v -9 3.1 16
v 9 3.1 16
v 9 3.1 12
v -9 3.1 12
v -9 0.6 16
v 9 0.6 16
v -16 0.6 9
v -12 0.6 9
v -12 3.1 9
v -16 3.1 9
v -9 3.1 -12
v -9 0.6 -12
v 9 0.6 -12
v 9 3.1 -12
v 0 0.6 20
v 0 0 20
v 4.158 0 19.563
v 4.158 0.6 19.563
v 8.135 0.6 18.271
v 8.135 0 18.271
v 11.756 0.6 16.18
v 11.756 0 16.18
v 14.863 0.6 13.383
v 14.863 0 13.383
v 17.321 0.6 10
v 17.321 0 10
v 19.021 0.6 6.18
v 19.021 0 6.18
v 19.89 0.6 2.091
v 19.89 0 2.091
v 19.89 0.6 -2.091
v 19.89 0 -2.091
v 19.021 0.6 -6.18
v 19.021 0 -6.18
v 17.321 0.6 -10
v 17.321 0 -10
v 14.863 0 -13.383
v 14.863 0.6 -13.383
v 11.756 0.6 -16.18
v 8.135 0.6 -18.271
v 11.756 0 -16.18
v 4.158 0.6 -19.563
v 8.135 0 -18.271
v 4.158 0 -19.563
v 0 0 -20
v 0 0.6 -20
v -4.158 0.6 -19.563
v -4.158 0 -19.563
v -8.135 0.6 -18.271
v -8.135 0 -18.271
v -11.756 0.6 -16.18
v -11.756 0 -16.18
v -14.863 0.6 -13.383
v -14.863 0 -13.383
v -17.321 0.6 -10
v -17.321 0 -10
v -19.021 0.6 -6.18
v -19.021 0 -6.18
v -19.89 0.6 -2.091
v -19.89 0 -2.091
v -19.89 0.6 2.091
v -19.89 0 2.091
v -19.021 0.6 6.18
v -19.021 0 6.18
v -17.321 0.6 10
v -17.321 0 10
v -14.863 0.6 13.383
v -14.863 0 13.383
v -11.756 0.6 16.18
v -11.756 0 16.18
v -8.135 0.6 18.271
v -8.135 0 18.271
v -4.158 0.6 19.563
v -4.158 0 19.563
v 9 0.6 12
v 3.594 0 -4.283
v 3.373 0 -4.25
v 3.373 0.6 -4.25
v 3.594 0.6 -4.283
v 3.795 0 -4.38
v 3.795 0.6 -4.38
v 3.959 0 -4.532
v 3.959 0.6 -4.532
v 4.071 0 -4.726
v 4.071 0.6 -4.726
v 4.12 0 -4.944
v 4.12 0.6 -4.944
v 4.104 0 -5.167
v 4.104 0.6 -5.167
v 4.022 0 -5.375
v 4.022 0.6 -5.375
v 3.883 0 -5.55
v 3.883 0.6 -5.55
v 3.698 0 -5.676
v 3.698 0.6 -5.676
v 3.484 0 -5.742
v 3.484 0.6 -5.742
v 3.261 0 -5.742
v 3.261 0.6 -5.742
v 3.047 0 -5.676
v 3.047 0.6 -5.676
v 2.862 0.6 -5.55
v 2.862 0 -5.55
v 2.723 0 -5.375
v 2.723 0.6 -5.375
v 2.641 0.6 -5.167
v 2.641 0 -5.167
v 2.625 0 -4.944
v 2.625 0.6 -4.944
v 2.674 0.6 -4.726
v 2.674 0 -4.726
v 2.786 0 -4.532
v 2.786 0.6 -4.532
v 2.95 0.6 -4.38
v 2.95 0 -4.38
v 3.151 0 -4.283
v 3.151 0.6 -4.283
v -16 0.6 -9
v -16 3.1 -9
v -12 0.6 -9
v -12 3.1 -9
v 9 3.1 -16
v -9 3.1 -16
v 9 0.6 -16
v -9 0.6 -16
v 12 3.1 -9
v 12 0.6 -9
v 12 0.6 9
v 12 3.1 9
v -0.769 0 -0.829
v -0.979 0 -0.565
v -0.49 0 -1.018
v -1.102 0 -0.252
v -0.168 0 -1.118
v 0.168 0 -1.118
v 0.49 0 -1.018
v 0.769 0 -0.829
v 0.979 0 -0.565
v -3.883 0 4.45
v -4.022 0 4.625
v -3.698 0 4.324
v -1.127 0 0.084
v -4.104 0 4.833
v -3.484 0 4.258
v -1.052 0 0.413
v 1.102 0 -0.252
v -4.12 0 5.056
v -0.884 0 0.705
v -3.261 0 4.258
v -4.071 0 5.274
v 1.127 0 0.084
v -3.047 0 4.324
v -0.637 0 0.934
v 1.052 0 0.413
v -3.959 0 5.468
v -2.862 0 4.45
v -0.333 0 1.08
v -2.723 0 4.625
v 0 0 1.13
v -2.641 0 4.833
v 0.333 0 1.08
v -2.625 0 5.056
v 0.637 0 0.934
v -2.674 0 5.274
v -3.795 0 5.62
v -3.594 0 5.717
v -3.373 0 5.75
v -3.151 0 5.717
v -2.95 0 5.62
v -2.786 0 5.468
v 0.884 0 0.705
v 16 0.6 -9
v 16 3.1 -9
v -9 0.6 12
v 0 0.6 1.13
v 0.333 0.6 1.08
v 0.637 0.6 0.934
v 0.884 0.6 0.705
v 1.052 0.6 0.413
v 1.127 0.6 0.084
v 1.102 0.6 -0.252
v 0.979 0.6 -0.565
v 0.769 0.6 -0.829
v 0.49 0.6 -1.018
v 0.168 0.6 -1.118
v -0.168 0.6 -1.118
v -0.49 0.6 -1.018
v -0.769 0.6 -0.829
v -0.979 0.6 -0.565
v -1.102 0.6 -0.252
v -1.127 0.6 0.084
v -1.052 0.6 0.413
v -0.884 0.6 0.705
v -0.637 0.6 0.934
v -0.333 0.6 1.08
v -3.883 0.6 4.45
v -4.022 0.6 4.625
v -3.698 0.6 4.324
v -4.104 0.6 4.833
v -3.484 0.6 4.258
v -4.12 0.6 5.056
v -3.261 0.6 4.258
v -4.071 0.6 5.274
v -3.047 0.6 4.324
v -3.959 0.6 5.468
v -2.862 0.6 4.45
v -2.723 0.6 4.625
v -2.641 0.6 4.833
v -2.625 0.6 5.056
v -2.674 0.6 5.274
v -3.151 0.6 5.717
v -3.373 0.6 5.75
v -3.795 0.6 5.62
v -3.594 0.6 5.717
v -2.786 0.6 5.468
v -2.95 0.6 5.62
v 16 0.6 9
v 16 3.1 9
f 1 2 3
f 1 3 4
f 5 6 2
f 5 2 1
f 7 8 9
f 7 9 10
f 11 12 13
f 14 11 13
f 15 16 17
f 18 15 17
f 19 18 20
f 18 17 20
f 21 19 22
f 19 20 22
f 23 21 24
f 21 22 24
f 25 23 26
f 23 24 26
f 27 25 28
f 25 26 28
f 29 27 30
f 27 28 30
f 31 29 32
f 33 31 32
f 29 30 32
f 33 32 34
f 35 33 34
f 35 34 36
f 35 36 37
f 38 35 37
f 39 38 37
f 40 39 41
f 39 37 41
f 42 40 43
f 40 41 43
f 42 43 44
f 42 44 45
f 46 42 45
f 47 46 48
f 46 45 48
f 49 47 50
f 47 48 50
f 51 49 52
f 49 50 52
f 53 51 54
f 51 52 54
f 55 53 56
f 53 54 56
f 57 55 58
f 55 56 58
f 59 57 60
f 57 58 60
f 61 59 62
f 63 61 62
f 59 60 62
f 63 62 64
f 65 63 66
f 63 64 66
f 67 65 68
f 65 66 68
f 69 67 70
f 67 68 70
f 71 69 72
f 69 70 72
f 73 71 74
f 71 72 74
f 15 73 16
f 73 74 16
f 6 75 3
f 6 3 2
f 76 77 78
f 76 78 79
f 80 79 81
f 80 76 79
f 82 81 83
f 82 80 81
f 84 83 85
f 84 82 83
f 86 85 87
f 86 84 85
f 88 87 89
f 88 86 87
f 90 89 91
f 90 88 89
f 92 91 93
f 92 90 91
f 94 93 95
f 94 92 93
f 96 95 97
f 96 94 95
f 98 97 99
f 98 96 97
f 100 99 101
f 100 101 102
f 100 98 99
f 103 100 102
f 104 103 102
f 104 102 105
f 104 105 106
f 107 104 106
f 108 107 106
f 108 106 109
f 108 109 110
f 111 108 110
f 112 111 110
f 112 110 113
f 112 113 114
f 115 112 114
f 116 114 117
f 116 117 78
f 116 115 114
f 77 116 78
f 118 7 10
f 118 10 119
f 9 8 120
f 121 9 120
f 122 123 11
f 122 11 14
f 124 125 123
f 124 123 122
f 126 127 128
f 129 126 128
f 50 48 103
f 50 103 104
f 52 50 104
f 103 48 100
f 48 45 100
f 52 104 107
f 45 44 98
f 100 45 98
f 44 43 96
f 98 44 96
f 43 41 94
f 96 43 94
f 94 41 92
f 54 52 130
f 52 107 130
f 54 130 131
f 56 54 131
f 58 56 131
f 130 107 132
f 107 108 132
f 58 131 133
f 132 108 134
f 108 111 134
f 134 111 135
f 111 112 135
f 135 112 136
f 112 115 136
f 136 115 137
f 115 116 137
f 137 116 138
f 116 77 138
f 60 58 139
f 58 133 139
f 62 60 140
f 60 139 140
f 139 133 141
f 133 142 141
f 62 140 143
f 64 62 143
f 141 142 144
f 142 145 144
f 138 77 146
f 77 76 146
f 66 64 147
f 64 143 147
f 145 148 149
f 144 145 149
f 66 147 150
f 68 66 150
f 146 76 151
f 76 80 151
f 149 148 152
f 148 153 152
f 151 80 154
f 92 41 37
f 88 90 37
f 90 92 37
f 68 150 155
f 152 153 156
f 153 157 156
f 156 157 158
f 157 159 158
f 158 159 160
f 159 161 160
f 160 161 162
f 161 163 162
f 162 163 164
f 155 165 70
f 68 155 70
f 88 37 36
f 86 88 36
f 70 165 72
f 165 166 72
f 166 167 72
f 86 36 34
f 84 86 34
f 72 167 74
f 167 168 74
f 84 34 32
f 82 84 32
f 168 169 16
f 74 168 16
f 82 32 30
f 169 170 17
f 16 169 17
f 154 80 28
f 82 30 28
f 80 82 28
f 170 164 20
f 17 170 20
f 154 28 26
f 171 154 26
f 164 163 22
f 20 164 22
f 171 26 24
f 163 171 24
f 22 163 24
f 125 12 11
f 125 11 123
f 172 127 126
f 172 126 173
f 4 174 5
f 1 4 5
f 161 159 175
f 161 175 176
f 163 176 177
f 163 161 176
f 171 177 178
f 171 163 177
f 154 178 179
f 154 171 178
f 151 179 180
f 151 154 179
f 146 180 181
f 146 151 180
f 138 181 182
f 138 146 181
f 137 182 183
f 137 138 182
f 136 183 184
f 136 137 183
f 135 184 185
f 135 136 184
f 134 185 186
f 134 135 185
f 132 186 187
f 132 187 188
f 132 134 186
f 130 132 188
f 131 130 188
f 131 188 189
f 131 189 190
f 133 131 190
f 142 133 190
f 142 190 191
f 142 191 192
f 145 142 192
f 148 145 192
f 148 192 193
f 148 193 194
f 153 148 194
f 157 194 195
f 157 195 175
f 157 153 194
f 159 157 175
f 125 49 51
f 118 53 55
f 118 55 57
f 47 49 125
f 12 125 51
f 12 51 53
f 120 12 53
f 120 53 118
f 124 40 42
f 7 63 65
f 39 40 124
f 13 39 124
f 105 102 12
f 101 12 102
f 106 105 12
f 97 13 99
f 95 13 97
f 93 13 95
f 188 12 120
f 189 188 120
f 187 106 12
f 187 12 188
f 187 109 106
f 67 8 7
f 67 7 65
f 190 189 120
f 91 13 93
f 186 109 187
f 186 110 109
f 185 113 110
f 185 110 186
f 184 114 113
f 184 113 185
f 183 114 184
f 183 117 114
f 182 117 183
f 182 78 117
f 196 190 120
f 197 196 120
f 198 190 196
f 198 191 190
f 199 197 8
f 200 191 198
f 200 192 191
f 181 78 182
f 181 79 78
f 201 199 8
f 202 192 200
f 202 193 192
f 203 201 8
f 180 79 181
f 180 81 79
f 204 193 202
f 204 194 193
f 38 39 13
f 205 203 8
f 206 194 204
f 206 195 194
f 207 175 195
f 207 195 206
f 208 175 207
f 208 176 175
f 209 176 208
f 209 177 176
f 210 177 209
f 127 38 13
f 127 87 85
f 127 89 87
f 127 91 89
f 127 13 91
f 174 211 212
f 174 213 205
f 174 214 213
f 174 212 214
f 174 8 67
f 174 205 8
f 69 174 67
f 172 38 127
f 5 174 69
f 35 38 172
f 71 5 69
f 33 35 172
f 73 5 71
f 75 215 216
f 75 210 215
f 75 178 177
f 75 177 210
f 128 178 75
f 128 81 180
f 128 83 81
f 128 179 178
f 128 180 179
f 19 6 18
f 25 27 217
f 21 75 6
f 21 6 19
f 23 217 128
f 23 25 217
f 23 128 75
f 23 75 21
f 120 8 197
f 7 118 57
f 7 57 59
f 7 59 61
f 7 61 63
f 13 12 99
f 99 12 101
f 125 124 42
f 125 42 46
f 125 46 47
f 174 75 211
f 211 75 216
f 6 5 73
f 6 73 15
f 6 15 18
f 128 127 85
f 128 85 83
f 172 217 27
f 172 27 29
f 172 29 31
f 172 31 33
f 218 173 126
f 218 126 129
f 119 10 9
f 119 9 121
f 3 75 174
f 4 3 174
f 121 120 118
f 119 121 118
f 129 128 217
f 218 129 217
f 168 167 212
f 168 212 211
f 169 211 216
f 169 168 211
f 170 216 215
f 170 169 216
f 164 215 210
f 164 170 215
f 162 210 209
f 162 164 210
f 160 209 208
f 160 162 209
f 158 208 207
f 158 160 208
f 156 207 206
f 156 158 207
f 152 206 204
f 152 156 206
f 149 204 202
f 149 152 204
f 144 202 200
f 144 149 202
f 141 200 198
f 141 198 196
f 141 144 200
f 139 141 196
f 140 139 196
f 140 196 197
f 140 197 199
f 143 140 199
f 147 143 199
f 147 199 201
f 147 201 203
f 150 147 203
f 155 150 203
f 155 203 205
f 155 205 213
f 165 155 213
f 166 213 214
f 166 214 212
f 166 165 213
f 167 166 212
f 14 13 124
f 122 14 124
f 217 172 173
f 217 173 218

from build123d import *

# Parameters (mm, degrees)
SKETCH1_R                    = 20
SKETCH1_R_2                  = 1.1303
SKETCH1_R_3                  = 0.75
PCB_DEPTH                    = 0.6
SKETCH2_W                    = 18
SKETCH2_H                    = 4
HIROSE_CONNECTOR_STACK_DEPTH = 2.5
CIRPATTERN1_COUNT            = 4


with BuildPart() as part:
    # Sketch1 → PCB (new body)
    with BuildSketch(Plane(origin=(0, 0, 0), x_dir=(1, 0, 0), z_dir=(0, 1, 0))):
        with Locations(Location((0, 0, 0), (0, 0, 270))):
            Circle(SKETCH1_R)
        with Locations(Location((0, 0, 0), (0, 0, 270))):
            Circle(SKETCH1_R_2, mode=Mode.SUBTRACT)
        with Locations(Location((3.372542584, 5, 0), (0, 0, 270))):
            Circle(SKETCH1_R_3, mode=Mode.SUBTRACT)
        with Locations(Location((-3.372542584, -5, 0), (0, 0, 270))):
            Circle(SKETCH1_R_3, mode=Mode.SUBTRACT)
    extrude(amount=PCB_DEPTH)

    # Sketch2 → Hirose Connector Stack (add)
    with BuildSketch(Plane(origin=(0, 0.6, 0), x_dir=(1, 0, 0), z_dir=(0, 1, 0))):
        with Locations((0, 14)):
            Rectangle(SKETCH2_W, SKETCH2_H)
    hirose_connector_stack = extrude(amount=HIROSE_CONNECTOR_STACK_DEPTH)

    # CirPattern1: Hirose Connector Stack ×4 about axis
    cirpattern1_axis = Axis((0, 0, 0), (0, 1, 0))
    for i in range(1, CIRPATTERN1_COUNT):
        add(hirose_connector_stack.rotate(cirpattern1_axis, i * 360 / CIRPATTERN1_COUNT))


solid = part.part
